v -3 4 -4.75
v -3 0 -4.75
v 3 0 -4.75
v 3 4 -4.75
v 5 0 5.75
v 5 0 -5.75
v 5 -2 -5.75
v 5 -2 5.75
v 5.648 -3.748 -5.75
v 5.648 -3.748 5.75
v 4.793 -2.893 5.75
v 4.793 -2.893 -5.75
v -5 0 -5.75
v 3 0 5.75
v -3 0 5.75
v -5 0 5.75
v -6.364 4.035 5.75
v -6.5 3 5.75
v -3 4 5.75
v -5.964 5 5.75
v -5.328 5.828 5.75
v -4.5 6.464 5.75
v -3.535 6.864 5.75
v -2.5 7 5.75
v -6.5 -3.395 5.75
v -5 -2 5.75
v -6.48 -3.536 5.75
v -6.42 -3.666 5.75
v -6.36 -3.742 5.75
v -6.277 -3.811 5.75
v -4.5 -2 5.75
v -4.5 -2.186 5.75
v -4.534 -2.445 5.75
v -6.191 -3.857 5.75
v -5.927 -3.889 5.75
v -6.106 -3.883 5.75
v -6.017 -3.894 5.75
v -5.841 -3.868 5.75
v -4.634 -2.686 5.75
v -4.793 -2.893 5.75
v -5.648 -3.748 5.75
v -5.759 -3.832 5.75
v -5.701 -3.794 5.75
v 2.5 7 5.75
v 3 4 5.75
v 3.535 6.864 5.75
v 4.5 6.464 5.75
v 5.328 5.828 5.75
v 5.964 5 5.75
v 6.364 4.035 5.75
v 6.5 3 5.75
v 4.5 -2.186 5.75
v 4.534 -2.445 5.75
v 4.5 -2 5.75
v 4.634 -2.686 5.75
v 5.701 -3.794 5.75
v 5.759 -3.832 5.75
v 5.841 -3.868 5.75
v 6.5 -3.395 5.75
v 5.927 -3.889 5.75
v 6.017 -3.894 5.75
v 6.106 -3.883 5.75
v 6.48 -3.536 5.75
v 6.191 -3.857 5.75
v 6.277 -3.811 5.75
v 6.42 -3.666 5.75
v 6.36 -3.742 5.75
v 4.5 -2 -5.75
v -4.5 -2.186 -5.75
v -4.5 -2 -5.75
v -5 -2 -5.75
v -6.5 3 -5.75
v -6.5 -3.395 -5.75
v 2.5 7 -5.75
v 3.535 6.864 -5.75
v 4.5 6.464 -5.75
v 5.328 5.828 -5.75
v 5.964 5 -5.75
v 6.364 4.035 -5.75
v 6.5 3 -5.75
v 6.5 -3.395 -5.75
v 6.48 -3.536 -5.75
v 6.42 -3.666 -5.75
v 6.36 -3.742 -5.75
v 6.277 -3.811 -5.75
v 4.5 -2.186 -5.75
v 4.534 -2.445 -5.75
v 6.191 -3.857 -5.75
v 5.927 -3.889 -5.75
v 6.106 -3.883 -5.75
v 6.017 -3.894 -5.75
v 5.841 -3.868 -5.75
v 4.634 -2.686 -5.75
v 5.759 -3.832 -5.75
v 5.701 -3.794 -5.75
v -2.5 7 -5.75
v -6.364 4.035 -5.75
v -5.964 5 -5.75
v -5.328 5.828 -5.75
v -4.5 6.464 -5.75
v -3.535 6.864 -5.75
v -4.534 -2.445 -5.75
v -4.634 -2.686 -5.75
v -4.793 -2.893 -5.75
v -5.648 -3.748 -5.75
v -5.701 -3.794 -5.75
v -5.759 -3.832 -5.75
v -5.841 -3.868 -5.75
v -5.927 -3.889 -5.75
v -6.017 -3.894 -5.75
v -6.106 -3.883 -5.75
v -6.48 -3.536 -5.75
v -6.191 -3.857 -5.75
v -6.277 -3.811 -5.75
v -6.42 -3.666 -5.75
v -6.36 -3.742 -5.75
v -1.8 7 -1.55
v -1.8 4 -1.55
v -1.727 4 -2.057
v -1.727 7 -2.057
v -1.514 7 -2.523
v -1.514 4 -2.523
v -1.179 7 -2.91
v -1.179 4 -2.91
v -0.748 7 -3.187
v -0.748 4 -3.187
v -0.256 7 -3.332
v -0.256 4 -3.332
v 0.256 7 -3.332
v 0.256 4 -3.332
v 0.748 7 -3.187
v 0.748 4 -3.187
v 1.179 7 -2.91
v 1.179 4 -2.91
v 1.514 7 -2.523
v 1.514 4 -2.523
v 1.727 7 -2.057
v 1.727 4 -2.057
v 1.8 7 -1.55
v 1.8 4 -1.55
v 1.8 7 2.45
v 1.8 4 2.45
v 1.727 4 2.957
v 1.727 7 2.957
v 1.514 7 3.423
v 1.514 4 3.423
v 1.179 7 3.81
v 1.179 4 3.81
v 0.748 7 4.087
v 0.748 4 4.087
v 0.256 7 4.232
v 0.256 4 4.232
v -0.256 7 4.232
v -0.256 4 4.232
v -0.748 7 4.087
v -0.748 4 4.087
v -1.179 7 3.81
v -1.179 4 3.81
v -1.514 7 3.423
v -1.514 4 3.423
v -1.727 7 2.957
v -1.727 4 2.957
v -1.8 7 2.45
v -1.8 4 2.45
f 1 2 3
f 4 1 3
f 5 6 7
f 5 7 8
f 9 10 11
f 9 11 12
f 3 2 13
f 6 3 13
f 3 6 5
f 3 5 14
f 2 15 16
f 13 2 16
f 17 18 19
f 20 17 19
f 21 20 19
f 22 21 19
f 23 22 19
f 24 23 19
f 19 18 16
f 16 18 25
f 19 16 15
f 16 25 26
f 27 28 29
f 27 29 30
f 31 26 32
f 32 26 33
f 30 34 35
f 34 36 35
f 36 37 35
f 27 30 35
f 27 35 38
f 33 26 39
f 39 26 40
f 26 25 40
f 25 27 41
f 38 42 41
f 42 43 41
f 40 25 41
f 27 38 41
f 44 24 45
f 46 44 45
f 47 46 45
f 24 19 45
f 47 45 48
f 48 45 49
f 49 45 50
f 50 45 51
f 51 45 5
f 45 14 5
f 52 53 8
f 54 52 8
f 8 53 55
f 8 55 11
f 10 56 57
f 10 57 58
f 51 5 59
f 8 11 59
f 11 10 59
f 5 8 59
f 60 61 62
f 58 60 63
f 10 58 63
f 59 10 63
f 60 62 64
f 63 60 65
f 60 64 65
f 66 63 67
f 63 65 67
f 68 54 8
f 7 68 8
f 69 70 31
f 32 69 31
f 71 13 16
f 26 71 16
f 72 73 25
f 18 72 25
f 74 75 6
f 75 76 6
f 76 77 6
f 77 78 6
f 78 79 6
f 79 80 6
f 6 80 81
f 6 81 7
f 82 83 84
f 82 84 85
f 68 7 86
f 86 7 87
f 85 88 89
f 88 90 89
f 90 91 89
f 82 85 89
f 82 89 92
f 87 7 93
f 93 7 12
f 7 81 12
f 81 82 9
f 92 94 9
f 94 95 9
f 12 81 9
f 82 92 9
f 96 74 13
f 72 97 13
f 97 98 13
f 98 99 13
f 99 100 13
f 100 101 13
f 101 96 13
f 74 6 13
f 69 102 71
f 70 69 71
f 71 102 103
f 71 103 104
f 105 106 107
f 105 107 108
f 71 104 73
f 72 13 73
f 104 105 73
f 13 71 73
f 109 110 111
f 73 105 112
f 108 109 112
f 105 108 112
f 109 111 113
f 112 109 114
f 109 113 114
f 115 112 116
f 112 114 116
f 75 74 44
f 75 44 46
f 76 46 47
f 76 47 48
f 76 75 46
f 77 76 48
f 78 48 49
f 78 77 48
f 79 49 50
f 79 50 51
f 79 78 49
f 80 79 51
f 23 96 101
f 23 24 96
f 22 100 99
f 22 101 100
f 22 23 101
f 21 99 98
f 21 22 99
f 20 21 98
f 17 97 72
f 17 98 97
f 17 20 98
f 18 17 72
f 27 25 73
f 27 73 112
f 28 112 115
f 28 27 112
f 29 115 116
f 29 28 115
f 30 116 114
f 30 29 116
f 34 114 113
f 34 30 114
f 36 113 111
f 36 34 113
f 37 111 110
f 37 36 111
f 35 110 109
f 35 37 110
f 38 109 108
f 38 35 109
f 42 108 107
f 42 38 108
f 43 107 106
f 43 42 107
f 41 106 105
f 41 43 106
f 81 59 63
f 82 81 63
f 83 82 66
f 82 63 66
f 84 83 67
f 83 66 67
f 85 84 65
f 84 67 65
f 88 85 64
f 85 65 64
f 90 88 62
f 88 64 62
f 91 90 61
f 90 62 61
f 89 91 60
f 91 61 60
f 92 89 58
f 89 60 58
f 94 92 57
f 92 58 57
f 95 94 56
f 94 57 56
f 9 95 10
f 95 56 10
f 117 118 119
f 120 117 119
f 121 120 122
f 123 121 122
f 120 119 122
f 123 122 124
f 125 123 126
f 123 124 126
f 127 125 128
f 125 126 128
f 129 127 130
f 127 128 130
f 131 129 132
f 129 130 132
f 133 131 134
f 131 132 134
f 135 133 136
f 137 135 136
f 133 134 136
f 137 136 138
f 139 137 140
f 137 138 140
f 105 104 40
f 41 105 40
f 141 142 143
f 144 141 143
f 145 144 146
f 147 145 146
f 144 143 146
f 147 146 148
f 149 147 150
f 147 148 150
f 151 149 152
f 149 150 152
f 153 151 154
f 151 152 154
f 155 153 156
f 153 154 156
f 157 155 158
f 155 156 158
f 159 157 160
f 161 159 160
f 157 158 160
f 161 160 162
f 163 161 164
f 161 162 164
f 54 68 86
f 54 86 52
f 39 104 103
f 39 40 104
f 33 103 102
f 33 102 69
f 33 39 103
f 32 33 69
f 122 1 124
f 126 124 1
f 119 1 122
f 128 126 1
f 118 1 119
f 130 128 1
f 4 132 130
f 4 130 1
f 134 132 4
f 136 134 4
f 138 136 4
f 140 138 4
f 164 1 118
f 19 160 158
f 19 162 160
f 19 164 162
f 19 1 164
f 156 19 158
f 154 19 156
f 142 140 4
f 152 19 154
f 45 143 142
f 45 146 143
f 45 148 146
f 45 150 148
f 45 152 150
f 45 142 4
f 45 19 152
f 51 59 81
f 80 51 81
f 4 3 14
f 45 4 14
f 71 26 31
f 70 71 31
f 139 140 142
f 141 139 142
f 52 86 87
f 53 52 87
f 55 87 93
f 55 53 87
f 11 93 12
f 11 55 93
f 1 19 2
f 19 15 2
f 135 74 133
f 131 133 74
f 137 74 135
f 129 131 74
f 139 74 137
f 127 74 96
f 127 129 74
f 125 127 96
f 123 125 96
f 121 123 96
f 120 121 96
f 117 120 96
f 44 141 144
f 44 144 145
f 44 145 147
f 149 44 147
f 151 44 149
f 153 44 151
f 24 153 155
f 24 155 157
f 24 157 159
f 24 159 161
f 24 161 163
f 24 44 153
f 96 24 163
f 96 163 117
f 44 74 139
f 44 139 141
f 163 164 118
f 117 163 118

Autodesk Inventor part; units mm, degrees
ref_plane "YZ Plane" through (0, 0, 0) normal (1, 0, 0) x (0, 1, 0)
ref_plane "XZ Plane" through (0, 0, 0) normal (0, 1, 0) x (-1, 0, 0)
ref_plane "XY Plane" through (0, 0, 0) normal (0, 0, 1) x (1, 0, 0)
sketch "Sketch1" plane through (0, 0, 0) normal (0, 1, 0) x (-1, 0, 0)
  line L0 (6.5, 5.75) -> (-6.5, 5.75)
  line L1 (-6.5, 5.75) -> (-6.5, -5.75)
  line L2 (-6.5, -5.75) -> (6.5, -5.75)
  line L3 (6.5, -5.75) -> (6.5, 5.75)
  line L4 (6.5, 5.75) -> (-6.5, -5.75) construction
  line L5 (-6.5, 5.75) -> (6.5, -5.75) construction
  point P0 (0, 0)
  dimension "d0" = 13
  dimension "d1" = 11.5
extrude "Extrusion1" add sketch "Sketch1" along normal blind 7
sketch "Sketch2" plane through (0, 0, 0) normal (0, -1, 0) x (1, 0, 0)
  line L0 (3, 5.75) -> (-3, 5.75)
  line L1 (-3, 5.75) -> (-3, -4.75)
  line L2 (-3, -4.75) -> (3, -4.75)
  line L3 (3, -4.75) -> (3, 5.75)
  line L4 (3, 5.75) -> (-3, -4.75) construction
  line L5 (-3, 5.75) -> (3, -4.75) construction
  line L6 (-6.5, 5.75) -> (6.5, 5.75) projected
  point P0 (0, 0)
  point P1 (0, 0.5)
  dimension "d4" = 6
  dimension "d5" = 10.5
extrude "Extrusion2" cut sketch "Sketch2" against normal blind 4
sketch "Sketch4" plane through (0, 4, 0) normal (0, -1, 0) x (1, 0, 0)
  line L0 (0, 4.25) -> (0, -3.35) construction
  line L1 (-1.8, 2.45) -> (-1.8, -1.55)
  line L2 (1.8, -1.55) -> (1.8, 2.45)
  arc A0 (1.8, 2.45) -> (-1.8, 2.45) centre (0, 2.45) ccw
  arc A1 (-1.8, -1.55) -> (1.8, -1.55) centre (0, -1.55) ccw
  line L3 (-3, 5.75) -> (3, 5.75) projected
  point P0 (0, 0)
  point P1 (0, 0.45)
  dimension "d15" = 3.6
  dimension "d16" = 4
  dimension "d17" = 3.3
extrude "Extrusion4" cut sketch "Sketch4" against normal blind 3
sketch "Sketch5" plane through (0, 0, 0) normal (0, -1, 0) x (1, 0, 0)
  line L0 (6.5, 5.75) -> (6.5, -5.75) projected
  line L1 (3, 5.75) -> (6.5, 5.75) projected
  line L2 (6.5, -5.75) -> (5, -5.75)
  line L3 (5, -5.75) -> (5, 5.75)
  line L4 (5, 5.75) -> (6.5, 5.75)
  line L5 (6.5, 5.75) -> (6.5, -5.75)
  line L6 (-6.5, -5.75) -> (-6.5, 5.75) projected
  line L7 (-6.5, 5.75) -> (-3, 5.75) projected
  line L8 (-6.5, -5.75) -> (-5, -5.75)
  line L9 (-5, -5.75) -> (-5, 5.75)
  line L10 (-5, 5.75) -> (-6.5, 5.75)
  line L11 (-6.5, 5.75) -> (-6.5, -5.75)
  point P0 (0, 0)
  dimension "d24" = 1.5
  dimension "d25" = 1.5
extrude "Extrusion5" add sketch "Sketch5" along normal blind 2
sketch "Sketch6" plane through (0, -2, 0) normal (0, -1, 0) x (1, 0, 0)
  line L0 (6.5, 5.75) -> (6.5, -5.75) projected
  line L1 (6.5, -5.75) -> (4.5, -5.75)
  line L2 (4.5, -5.75) -> (4.5, 5.75)
  line L3 (4.5, 5.75) -> (6.5, 5.75)
  line L4 (6.5, 5.75) -> (6.5, -5.75)
  line L5 (-6.5, -5.75) -> (-6.5, 5.75) projected
  line L6 (-6.5, -5.75) -> (-4.5, -5.75)
  line L7 (-4.5, -5.75) -> (-4.5, 5.75)
  line L8 (-4.5, 5.75) -> (-6.5, 5.75)
  line L9 (-6.5, 5.75) -> (-6.5, -5.75)
  point P0 (0, 0)
  dimension "d28" = 2
  dimension "d29" = 2
extrude "Extrusion6" add sketch "Sketch6" along normal blind 2
chamfer "Chamfer2" distance 1.4 angle 45 2 edges at (4.5, -4, 0) (-4.5, -4, 0)
fillet "Fillet2" radius 1 2 edges at (4.5, -2.6, 0) (-4.5, -2.6, 0)
fillet "Fillet3" radius 0.5 4 edges at (6.5, -4, 0) (5.9, -4, 0) (-6.5, -4, 0) (-5.9, -4, 0)
fillet "Fillet4" radius 4 2 edges at (6.5, 7, 0) (-6.5, 7, 0)
properties part number "IR_Focus_Dark"
